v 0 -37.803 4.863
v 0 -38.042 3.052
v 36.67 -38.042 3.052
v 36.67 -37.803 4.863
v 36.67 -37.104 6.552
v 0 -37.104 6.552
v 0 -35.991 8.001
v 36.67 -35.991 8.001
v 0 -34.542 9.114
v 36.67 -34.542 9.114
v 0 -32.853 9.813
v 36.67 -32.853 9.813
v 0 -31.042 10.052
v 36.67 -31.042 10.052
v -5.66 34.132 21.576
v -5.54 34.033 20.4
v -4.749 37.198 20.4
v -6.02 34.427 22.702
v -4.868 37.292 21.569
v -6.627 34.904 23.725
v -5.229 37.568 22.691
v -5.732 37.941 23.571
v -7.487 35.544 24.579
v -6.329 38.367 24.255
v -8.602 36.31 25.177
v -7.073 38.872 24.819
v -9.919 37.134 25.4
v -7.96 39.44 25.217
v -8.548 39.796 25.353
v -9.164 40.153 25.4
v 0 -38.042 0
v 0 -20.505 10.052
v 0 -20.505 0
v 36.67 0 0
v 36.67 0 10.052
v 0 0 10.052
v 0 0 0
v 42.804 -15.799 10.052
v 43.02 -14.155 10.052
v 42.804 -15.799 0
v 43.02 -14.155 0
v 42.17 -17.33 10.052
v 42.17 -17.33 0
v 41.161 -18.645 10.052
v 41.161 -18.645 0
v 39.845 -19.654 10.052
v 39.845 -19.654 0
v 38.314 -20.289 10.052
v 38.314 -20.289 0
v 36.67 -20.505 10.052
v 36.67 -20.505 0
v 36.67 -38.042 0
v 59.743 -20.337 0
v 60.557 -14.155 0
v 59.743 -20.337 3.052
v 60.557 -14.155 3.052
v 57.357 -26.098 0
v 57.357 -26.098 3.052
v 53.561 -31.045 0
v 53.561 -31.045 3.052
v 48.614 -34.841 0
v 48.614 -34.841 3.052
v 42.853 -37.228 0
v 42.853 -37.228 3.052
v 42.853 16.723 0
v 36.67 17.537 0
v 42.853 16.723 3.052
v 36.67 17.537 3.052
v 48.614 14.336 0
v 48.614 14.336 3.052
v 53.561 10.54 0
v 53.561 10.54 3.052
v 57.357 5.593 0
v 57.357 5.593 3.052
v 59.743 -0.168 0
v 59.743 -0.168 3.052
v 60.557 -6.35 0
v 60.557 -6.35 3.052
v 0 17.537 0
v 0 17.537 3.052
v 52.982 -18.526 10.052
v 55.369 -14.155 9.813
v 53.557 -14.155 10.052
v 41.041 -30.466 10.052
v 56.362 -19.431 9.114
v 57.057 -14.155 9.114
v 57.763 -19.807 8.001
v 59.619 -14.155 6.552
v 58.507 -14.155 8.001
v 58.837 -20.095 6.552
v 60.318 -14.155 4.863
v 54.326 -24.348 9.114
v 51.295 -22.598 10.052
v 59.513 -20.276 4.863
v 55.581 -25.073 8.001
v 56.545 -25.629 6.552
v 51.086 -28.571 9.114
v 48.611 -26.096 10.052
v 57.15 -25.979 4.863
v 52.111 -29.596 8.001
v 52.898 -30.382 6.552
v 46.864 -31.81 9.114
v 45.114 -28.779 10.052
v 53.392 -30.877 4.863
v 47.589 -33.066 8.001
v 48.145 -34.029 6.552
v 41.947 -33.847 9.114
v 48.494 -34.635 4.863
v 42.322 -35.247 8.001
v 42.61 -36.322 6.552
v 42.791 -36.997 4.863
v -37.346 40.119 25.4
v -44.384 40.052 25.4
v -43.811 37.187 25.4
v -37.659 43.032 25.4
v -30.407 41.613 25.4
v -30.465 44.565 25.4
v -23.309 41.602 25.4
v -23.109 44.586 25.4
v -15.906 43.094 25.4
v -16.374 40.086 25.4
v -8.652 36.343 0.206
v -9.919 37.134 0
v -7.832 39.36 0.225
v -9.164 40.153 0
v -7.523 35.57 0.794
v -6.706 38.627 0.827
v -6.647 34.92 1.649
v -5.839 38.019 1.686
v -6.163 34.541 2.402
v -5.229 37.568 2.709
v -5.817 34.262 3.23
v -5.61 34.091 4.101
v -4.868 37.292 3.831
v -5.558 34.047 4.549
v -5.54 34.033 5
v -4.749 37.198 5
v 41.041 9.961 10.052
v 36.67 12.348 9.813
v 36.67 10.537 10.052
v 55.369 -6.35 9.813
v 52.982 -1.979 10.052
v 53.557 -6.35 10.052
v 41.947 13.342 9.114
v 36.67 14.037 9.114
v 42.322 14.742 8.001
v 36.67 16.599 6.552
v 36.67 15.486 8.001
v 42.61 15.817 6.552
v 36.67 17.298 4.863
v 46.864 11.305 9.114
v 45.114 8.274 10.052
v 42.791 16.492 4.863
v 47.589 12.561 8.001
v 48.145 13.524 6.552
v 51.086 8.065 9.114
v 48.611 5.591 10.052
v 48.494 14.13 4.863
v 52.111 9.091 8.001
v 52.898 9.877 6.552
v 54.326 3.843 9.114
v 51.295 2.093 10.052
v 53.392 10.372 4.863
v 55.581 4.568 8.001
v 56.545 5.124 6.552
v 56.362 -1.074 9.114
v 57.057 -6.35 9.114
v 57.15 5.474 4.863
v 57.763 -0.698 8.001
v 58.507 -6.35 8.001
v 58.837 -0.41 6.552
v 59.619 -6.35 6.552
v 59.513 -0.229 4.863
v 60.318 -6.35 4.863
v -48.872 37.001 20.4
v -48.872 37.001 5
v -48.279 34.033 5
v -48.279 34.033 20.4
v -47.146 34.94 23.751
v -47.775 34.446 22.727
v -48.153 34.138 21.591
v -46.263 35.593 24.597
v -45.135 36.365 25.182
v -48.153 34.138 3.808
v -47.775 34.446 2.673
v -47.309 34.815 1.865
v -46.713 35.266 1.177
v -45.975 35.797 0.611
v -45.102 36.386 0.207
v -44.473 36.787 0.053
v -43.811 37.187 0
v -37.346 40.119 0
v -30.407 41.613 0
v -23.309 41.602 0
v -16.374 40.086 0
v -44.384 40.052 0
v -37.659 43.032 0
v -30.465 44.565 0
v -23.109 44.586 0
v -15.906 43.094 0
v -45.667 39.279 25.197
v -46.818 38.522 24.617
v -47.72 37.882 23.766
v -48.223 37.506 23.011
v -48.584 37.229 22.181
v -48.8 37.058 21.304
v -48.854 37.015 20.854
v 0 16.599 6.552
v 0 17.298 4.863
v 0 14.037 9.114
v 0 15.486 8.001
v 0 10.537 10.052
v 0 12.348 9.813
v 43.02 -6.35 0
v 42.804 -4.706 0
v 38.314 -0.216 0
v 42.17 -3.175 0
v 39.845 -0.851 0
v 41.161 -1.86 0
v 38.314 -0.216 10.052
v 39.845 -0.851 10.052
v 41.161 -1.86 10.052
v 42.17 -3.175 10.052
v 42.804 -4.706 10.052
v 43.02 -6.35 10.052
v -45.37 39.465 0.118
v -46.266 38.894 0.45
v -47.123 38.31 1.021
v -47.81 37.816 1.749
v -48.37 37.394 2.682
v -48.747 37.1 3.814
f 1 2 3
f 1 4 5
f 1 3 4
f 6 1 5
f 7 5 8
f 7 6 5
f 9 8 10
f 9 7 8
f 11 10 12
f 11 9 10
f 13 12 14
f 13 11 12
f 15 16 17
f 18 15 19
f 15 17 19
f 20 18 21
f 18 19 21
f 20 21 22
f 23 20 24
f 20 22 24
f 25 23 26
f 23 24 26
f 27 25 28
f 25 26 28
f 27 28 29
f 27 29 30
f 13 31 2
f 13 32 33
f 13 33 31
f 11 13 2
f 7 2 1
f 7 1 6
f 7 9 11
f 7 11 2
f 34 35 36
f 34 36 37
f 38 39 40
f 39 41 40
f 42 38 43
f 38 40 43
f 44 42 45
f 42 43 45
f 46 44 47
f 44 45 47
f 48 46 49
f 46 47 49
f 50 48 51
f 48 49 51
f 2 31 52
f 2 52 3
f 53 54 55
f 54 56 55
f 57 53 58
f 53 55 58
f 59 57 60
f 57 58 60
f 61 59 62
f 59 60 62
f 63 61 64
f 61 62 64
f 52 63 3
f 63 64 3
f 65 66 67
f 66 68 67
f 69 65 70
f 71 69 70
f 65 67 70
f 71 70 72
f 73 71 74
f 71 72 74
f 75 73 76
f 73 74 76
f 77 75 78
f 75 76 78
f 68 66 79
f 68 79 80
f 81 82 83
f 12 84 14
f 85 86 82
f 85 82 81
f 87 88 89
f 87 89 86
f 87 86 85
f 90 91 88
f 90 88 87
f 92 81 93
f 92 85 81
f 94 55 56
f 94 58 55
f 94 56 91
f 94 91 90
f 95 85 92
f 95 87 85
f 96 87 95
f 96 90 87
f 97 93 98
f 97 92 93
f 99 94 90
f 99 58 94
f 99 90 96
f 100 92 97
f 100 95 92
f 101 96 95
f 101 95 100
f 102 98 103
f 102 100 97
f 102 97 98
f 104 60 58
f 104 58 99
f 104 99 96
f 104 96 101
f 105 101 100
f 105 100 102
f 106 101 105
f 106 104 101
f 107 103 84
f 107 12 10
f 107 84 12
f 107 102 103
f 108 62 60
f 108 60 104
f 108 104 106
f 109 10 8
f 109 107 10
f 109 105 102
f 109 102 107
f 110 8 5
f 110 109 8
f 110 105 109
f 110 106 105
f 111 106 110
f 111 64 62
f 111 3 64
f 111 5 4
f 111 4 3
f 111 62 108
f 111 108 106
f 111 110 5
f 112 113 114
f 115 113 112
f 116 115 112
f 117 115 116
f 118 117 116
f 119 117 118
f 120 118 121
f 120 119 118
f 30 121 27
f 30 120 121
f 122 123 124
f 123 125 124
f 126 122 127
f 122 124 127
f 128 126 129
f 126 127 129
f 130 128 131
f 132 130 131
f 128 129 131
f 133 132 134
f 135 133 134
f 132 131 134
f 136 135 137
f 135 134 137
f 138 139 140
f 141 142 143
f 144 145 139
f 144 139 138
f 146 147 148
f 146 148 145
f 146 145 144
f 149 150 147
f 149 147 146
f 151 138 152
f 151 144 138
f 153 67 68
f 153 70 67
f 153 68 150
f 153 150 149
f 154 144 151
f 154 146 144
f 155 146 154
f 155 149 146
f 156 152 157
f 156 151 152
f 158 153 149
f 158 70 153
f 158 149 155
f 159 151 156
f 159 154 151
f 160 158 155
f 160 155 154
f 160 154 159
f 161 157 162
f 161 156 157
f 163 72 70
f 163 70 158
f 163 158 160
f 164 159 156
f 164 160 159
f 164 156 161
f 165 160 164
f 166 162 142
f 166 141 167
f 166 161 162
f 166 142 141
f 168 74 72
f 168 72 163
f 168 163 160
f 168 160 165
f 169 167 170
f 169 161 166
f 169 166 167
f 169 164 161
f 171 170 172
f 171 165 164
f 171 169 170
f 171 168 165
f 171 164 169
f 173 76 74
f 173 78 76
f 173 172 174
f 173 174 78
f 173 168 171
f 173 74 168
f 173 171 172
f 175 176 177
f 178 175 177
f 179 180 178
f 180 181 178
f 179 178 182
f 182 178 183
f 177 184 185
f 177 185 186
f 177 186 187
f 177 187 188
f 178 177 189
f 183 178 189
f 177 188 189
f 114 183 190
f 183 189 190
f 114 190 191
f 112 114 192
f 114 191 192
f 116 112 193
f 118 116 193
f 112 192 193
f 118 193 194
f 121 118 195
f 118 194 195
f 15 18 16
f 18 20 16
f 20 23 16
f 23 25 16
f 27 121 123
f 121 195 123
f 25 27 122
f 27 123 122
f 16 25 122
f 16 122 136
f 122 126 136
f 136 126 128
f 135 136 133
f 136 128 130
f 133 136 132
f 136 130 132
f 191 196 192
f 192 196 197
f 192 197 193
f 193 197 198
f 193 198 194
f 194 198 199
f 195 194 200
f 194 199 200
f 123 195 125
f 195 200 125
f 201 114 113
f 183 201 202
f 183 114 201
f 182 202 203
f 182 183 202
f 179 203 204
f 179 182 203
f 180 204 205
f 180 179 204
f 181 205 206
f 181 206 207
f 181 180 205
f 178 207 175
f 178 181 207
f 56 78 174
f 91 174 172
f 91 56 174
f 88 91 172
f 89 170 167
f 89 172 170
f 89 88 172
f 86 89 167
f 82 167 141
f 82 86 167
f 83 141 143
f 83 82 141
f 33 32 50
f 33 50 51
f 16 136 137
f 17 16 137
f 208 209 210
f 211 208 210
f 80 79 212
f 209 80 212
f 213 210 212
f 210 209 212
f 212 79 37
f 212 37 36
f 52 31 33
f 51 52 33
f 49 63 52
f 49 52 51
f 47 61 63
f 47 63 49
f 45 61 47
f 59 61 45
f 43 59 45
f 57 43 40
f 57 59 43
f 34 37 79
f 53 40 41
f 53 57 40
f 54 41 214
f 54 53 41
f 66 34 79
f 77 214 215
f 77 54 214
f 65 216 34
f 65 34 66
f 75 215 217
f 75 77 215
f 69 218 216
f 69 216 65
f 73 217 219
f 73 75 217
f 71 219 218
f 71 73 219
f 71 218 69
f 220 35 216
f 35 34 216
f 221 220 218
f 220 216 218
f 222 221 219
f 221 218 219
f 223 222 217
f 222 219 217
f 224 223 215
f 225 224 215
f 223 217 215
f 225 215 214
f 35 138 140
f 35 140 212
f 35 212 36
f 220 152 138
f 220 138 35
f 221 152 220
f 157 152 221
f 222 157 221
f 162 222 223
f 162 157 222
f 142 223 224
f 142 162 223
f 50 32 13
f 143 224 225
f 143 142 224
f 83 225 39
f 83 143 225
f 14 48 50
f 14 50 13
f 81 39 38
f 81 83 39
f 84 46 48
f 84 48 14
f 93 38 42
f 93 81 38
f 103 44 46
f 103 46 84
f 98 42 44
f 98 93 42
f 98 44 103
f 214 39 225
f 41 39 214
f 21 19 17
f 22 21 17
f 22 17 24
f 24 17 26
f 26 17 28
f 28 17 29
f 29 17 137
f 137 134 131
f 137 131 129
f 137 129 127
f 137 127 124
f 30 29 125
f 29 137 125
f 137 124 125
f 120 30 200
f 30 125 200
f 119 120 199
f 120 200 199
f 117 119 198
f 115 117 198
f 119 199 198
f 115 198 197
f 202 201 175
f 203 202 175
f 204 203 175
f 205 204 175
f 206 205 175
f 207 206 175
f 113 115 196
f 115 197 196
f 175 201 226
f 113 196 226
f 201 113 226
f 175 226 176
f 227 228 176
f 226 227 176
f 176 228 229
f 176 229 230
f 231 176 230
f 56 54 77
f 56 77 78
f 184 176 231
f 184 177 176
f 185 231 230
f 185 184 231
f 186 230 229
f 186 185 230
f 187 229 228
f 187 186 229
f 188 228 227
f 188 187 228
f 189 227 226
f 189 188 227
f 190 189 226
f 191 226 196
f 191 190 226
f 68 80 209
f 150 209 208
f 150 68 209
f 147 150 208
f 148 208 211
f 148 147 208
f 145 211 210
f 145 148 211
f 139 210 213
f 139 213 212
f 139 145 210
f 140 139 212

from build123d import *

# Parameters (mm, degrees)
F4_DEPTH = 25.4
F5_R     = 5
F6_R     = 5
F7_R     = 5
F8_R     = 5


with BuildPart() as f2:
    # F2: sweep along a path in F1
    with BuildLine(Plane.XY) as f2_path:
        Line((0, 0), (36.670453, 0))
        ThreePointArc((36.670453, 0), (41.160581, -1.859872), (43.020453, -6.35))
        Line((43.020453, -6.35), (43.020453, -14.155076))
        ThreePointArc((43.020453, -14.155076), (41.160581, -18.645204), (36.670453, -20.505076))
        Line((36.670453, -20.505076), (0, -20.505076))
    # F0 (on Right) → F2 (sweep)
    with BuildSketch(Plane.YZ):
        with BuildLine():
            Line((0, 10.051508), (0, 0))
            Line((0, 0), (17.53653, 0))
            Line((17.53653, 0), (17.53653, 3.051508))
            ThreePointArc((17.53653, 3.051508), (15.486278, 8.001255), (10.53653, 10.051508))
            Line((10.53653, 10.051508), (0, 10.051508))
        make_face()
    sweep(path=f2_path.line)


with BuildPart() as f4:
    # F3 (on Top) → F4 (new body)
    with BuildSketch(Plane.XY):
        with BuildLine():
            Line((-5.540201, 34.032665), (-4.748743, 37.198495))
            ThreePointArc((-4.748743, 37.198495), (-26.844994, 44.765678), (-48.872489, 37.00063))
            Line((-48.872489, 37.00063), (-48.278898, 34.032665))
            ThreePointArc((-48.278898, 34.032665), (-26.909549, 41.797038), (-5.540201, 34.032665))
        make_face()
    extrude(amount=F4_DEPTH)

    # F5
    f5_edges = [f4.edges().sort_by_distance(p)[0] for p in [
        (-48.575694, 35.516648, 0),
    ]]
    fillet(f5_edges, radius=F5_R)

    # F6
    f6_edges = [f4.edges().sort_by_distance(p)[0] for p in [
        (-5.144472, 35.61558, 0),
    ]]
    fillet(f6_edges, radius=F6_R)

    # F7
    f7_edges = [f4.edges().sort_by_distance(p)[0] for p in [
        (-5.144472, 35.61558, 25.4),
    ]]
    fillet(f7_edges, radius=F7_R)

    # F8
    f8_edges = [f4.edges().sort_by_distance(p)[0] for p in [
        (-48.575694, 35.516648, 25.4),
    ]]
    fillet(f8_edges, radius=F8_R)


solid = Compound([f2.part, f4.part])
